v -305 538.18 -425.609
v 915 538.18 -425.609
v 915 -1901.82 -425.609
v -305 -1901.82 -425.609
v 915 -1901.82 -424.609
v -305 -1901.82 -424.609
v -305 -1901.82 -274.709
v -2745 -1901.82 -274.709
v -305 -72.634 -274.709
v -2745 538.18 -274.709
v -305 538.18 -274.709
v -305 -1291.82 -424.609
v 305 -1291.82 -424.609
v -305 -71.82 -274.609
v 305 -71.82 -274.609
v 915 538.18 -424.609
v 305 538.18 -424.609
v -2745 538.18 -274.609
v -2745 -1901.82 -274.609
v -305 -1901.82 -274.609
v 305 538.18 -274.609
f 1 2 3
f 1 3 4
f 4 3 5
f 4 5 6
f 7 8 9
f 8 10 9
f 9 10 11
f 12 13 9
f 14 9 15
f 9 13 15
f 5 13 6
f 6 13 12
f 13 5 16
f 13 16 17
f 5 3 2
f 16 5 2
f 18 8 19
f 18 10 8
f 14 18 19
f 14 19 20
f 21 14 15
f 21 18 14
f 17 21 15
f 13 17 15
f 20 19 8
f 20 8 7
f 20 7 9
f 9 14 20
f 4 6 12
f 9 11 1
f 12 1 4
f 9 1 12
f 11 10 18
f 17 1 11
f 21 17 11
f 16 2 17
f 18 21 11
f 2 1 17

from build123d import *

# Parameters (mm, degrees)
SKETCH1_W           = 1220
SKETCH1_H           = 2440
BOSS_EXTRUDE1_DEPTH = 1
SKETCH2_W           = 610
SKETCH2_H           = 150
BOSS_EXTRUDE2_DEPTH = 1830
SKETCH3_W           = 0.1
SKETCH3_H           = 1830
BOSS_EXTRUDE3_DEPTH = 2440
SKETCH4_W           = 2440
SKETCH4_H           = 0.1
BOSS_EXTRUDE4_DEPTH = 610
DRAFT1_ANGLE        = 82.990615743


with BuildPart() as part:
    # Sketch1 → Boss-Extrude1 (new body)
    with BuildSketch(Plane(origin=(0, 0, -425.609273672), x_dir=(-1, 0, 0), z_dir=(0, 0, -1))):
        with Locations((-305, -681.820483208)):
            Rectangle(SKETCH1_W, SKETCH1_H)
    extrude(amount=-BOSS_EXTRUDE1_DEPTH)

    # Sketch2 → Boss-Extrude2 (add)
    with BuildSketch(Plane(origin=(0, 538.179516792, 0), x_dir=(1, 0, 0), z_dir=(0, 1, 0))):
        with Locations((0, 349.609273672)):
            Rectangle(SKETCH2_W, SKETCH2_H)
    extrude(amount=-BOSS_EXTRUDE2_DEPTH)

    # Sketch3 → Boss-Extrude3 (add)
    with BuildSketch(Plane.ZY.offset(305)):
        with Locations((-274.659273672, -376.820483208)):
            Rectangle(SKETCH3_W, SKETCH3_H)
    extrude(amount=BOSS_EXTRUDE3_DEPTH)

    # Sketch4 → Boss-Extrude4 (add)
    with BuildSketch(Plane.XZ.offset(1291.820483208)):
        with Locations((-1525, -274.659273672)):
            Rectangle(SKETCH4_W, SKETCH4_H)
    extrude(amount=BOSS_EXTRUDE4_DEPTH)

    # Draft1
    draft1_faces = [part.faces().sort_by_distance(p)[0] for p in [
        (0, -1291.820483208, -349.609273672),
    ]]
    draft(draft1_faces, Plane.XY.offset(-424.609273672), DRAFT1_ANGLE)


solid = part.part
